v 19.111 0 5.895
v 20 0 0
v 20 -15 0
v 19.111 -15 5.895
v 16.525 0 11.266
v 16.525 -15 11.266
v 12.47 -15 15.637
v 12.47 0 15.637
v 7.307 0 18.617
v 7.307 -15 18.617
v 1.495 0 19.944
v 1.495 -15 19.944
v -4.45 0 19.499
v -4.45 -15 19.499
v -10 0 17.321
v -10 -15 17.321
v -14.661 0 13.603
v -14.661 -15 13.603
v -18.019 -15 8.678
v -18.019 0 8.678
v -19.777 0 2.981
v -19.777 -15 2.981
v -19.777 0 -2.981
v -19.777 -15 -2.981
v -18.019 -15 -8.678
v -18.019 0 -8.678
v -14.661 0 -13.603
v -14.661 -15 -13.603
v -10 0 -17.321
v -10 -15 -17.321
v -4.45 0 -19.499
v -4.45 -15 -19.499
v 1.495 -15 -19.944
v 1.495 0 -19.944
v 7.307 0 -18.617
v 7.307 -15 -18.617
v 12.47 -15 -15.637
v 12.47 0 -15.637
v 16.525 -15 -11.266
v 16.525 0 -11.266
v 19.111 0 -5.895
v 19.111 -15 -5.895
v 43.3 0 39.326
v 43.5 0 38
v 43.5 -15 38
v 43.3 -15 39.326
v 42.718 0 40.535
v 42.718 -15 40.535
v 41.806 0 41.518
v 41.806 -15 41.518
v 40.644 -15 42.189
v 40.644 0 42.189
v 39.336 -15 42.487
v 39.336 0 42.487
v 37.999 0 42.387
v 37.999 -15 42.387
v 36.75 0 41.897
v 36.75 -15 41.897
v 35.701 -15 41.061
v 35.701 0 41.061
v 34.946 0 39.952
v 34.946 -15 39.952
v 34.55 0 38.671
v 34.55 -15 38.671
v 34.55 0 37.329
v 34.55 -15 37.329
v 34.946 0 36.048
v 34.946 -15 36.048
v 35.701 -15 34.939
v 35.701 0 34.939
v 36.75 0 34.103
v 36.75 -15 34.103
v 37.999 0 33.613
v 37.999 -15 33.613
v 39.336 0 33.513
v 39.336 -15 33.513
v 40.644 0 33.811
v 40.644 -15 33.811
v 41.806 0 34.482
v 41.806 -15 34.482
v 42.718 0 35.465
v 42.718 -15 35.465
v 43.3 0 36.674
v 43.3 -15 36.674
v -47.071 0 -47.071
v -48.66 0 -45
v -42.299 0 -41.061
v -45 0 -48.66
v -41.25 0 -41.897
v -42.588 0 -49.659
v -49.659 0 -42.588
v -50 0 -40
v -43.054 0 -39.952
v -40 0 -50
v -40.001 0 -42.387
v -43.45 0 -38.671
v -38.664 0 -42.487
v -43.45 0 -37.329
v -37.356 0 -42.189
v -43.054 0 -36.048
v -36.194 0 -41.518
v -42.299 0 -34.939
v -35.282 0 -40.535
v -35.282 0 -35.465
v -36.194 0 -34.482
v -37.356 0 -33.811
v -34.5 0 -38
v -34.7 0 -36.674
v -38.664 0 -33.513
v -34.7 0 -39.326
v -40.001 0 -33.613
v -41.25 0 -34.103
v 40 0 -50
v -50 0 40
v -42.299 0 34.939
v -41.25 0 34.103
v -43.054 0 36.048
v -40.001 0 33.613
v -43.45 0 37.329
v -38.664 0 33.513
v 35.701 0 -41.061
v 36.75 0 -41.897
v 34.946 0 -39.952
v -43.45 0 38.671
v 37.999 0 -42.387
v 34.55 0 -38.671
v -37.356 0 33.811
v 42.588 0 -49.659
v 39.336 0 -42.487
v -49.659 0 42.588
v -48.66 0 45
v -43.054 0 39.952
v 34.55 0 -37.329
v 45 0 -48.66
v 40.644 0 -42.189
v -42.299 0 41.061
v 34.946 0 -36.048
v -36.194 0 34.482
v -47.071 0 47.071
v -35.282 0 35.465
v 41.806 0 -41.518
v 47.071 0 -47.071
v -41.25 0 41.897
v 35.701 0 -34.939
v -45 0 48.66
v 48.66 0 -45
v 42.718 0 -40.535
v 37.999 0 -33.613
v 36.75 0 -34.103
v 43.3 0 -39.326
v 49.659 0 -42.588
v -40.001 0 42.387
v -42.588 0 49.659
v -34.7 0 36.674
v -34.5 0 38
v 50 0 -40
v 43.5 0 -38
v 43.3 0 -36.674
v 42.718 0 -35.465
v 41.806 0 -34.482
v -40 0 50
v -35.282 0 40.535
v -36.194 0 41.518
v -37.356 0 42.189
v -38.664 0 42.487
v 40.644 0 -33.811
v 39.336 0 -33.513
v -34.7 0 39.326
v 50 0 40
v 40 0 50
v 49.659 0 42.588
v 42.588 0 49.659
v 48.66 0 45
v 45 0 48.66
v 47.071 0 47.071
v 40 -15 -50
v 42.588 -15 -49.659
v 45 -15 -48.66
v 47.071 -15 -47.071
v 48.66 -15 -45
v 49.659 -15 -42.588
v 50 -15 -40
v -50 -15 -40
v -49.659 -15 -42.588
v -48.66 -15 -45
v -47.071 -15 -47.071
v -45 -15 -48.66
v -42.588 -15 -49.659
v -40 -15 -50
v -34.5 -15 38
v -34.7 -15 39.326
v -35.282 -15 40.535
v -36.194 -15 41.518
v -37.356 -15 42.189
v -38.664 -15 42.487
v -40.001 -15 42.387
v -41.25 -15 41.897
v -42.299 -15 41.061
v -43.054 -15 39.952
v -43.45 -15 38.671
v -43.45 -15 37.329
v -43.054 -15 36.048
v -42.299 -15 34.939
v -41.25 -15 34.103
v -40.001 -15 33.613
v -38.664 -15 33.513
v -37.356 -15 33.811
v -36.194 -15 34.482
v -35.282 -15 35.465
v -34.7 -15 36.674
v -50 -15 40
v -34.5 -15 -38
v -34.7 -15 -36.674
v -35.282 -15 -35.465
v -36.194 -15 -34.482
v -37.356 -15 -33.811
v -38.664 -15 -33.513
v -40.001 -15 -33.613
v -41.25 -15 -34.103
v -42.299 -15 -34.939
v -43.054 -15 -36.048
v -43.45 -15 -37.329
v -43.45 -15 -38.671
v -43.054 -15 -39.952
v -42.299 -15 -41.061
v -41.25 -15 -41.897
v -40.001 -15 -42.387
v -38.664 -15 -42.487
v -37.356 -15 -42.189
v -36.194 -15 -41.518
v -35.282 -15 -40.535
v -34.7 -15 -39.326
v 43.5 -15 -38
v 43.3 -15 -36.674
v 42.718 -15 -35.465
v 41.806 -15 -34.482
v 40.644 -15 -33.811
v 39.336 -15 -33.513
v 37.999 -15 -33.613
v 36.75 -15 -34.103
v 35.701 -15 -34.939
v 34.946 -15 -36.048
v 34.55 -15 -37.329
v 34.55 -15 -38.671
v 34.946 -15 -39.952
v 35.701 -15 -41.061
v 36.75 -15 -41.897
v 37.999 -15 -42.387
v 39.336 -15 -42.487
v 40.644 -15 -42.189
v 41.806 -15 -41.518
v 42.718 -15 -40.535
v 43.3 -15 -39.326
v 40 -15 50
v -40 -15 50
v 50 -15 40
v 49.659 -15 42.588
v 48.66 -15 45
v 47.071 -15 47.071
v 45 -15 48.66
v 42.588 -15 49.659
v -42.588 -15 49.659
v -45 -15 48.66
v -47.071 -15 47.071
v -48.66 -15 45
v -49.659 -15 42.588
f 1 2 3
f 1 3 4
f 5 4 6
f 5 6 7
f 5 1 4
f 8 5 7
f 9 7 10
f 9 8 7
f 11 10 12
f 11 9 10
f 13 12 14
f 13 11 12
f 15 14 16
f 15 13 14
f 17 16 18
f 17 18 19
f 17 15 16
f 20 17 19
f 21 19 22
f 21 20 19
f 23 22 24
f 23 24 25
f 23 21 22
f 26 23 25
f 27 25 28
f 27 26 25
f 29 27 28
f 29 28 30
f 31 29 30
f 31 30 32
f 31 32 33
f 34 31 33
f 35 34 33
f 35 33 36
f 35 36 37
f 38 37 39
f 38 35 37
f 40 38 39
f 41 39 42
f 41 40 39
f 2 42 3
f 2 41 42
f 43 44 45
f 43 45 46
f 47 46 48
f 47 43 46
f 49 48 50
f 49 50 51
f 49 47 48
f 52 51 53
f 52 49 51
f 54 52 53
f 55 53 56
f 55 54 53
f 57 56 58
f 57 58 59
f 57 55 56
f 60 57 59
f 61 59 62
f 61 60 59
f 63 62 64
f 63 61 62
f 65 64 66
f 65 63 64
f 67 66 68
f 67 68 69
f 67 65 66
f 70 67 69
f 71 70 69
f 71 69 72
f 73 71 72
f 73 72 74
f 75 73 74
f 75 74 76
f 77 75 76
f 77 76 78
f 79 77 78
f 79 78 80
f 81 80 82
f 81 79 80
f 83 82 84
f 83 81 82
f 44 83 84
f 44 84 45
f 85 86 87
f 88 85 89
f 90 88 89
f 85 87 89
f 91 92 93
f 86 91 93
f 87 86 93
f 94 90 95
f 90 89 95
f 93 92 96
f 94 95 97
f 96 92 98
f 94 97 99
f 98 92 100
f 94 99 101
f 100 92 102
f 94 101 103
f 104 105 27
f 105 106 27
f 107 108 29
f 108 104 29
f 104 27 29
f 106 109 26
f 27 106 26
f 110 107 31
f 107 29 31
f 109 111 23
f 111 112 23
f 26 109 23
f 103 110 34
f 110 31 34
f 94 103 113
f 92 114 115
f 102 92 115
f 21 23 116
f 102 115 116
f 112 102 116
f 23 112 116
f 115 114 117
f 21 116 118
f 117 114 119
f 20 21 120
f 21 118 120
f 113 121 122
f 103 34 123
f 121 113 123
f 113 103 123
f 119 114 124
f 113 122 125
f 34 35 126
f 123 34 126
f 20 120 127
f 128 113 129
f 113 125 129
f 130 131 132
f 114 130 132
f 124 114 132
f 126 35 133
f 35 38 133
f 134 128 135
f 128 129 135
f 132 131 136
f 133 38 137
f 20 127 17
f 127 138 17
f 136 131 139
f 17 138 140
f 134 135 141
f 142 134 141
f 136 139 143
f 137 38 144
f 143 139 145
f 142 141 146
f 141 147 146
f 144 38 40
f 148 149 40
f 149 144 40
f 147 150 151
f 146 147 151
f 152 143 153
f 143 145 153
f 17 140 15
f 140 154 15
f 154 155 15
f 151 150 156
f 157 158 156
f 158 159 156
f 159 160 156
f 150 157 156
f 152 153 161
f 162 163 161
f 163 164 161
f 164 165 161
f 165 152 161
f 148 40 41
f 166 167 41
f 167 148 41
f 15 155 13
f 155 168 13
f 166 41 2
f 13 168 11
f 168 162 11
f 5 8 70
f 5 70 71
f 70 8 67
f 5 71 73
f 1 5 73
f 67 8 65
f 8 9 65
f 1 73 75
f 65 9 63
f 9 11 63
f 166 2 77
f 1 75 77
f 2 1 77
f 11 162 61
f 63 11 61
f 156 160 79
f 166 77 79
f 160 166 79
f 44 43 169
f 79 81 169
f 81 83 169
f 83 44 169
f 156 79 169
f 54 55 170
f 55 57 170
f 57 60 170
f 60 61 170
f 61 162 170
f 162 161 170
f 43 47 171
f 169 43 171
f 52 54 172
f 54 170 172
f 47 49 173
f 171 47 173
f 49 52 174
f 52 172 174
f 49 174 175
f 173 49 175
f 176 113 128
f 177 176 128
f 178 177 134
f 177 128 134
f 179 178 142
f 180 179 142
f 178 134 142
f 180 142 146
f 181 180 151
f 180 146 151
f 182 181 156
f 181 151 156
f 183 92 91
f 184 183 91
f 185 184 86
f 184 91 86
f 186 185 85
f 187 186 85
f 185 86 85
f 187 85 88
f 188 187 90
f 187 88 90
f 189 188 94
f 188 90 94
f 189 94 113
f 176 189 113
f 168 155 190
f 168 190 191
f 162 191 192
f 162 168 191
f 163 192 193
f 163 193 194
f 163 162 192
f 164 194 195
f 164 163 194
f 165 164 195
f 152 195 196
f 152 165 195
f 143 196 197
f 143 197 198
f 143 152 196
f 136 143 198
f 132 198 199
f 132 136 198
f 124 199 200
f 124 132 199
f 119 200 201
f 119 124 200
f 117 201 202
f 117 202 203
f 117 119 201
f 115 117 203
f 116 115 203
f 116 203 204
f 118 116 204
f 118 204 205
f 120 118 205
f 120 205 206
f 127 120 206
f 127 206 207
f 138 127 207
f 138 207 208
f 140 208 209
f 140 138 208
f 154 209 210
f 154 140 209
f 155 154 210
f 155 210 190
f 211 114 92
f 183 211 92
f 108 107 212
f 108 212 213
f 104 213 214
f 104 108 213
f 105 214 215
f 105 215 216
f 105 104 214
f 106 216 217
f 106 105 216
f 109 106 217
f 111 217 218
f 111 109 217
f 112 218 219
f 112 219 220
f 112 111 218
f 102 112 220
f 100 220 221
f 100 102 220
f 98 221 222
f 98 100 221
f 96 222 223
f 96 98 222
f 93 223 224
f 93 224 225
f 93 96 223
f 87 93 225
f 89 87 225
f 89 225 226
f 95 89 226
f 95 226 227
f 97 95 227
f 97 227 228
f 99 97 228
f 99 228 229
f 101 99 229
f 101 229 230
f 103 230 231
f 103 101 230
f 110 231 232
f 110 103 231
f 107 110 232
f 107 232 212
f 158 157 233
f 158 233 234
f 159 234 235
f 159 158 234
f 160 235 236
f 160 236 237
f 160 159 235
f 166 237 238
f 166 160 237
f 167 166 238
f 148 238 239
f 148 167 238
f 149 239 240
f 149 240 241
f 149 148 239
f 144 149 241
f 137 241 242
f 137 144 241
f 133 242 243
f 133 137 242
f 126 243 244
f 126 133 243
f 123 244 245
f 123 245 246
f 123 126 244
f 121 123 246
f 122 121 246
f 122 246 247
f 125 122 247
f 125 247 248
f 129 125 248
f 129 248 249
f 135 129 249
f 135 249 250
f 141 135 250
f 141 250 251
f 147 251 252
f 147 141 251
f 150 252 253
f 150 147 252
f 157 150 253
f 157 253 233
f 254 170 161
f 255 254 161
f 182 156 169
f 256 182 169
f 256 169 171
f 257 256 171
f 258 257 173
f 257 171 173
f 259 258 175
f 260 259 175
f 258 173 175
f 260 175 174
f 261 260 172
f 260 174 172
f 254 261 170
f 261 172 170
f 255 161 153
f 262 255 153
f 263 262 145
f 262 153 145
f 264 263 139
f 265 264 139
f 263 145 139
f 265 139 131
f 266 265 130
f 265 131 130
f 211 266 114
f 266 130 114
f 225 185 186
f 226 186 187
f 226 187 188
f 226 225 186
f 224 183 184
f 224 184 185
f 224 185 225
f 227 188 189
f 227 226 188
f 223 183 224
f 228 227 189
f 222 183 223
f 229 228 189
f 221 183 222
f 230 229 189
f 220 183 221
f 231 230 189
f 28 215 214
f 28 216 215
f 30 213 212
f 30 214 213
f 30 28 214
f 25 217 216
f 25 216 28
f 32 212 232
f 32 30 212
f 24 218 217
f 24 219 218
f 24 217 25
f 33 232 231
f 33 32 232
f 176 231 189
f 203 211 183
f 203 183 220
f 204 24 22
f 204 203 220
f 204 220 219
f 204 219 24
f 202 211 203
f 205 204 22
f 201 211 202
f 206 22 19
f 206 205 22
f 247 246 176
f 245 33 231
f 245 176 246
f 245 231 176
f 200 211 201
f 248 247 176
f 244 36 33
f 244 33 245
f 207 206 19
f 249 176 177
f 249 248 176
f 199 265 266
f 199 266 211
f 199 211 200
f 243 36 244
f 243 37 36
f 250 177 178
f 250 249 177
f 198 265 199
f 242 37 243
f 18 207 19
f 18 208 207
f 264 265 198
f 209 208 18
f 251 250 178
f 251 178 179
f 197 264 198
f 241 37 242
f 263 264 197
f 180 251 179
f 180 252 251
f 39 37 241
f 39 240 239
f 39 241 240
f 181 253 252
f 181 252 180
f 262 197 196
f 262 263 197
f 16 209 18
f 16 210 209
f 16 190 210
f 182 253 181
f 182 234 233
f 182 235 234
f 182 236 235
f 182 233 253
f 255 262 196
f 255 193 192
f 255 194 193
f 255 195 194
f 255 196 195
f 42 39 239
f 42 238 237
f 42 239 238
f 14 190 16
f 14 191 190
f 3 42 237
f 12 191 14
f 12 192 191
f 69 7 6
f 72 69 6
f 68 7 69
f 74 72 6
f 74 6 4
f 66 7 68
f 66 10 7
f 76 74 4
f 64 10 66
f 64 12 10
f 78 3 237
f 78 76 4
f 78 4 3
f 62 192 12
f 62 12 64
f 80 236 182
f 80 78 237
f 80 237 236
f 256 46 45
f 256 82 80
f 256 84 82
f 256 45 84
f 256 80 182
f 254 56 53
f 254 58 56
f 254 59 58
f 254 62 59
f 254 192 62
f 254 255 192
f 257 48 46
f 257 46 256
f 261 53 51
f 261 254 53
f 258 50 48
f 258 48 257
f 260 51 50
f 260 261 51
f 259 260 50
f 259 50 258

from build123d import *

# Parameters (mm, degrees)
F0_R     = 4.5
F0_R_2   = 20
F1_DEPTH = 15


with BuildPart() as f1:
    # F0 (on Front) → F1 (new body)
    with BuildSketch(Plane.XZ):
        with BuildLine():
            Line((40, 50), (-40, 50))
            ThreePointArc((-40, 50), (-47.071068, 47.071068), (-50, 40))
            Line((-50, 40), (-50, -40))
            ThreePointArc((-50, -40), (-47.071068, -47.071068), (-40, -50))
            Line((-40, -50), (40, -50))
            ThreePointArc((40, -50), (47.071068, -47.071068), (50, -40))
            Line((50, -40), (50, 40))
            ThreePointArc((50, 40), (47.071068, 47.071068), (40, 50))
        make_face()
        with Locations((-39, -38)):
            Circle(F0_R, mode=Mode.SUBTRACT)
        with Locations((39, -38)):
            Circle(F0_R, mode=Mode.SUBTRACT)
        with Locations((-39, 38)):
            Circle(F0_R, mode=Mode.SUBTRACT)
        Circle(F0_R_2, mode=Mode.SUBTRACT)
        with Locations((39, 38)):
            Circle(F0_R, mode=Mode.SUBTRACT)
    extrude(amount=F1_DEPTH)


solid = f1.part
